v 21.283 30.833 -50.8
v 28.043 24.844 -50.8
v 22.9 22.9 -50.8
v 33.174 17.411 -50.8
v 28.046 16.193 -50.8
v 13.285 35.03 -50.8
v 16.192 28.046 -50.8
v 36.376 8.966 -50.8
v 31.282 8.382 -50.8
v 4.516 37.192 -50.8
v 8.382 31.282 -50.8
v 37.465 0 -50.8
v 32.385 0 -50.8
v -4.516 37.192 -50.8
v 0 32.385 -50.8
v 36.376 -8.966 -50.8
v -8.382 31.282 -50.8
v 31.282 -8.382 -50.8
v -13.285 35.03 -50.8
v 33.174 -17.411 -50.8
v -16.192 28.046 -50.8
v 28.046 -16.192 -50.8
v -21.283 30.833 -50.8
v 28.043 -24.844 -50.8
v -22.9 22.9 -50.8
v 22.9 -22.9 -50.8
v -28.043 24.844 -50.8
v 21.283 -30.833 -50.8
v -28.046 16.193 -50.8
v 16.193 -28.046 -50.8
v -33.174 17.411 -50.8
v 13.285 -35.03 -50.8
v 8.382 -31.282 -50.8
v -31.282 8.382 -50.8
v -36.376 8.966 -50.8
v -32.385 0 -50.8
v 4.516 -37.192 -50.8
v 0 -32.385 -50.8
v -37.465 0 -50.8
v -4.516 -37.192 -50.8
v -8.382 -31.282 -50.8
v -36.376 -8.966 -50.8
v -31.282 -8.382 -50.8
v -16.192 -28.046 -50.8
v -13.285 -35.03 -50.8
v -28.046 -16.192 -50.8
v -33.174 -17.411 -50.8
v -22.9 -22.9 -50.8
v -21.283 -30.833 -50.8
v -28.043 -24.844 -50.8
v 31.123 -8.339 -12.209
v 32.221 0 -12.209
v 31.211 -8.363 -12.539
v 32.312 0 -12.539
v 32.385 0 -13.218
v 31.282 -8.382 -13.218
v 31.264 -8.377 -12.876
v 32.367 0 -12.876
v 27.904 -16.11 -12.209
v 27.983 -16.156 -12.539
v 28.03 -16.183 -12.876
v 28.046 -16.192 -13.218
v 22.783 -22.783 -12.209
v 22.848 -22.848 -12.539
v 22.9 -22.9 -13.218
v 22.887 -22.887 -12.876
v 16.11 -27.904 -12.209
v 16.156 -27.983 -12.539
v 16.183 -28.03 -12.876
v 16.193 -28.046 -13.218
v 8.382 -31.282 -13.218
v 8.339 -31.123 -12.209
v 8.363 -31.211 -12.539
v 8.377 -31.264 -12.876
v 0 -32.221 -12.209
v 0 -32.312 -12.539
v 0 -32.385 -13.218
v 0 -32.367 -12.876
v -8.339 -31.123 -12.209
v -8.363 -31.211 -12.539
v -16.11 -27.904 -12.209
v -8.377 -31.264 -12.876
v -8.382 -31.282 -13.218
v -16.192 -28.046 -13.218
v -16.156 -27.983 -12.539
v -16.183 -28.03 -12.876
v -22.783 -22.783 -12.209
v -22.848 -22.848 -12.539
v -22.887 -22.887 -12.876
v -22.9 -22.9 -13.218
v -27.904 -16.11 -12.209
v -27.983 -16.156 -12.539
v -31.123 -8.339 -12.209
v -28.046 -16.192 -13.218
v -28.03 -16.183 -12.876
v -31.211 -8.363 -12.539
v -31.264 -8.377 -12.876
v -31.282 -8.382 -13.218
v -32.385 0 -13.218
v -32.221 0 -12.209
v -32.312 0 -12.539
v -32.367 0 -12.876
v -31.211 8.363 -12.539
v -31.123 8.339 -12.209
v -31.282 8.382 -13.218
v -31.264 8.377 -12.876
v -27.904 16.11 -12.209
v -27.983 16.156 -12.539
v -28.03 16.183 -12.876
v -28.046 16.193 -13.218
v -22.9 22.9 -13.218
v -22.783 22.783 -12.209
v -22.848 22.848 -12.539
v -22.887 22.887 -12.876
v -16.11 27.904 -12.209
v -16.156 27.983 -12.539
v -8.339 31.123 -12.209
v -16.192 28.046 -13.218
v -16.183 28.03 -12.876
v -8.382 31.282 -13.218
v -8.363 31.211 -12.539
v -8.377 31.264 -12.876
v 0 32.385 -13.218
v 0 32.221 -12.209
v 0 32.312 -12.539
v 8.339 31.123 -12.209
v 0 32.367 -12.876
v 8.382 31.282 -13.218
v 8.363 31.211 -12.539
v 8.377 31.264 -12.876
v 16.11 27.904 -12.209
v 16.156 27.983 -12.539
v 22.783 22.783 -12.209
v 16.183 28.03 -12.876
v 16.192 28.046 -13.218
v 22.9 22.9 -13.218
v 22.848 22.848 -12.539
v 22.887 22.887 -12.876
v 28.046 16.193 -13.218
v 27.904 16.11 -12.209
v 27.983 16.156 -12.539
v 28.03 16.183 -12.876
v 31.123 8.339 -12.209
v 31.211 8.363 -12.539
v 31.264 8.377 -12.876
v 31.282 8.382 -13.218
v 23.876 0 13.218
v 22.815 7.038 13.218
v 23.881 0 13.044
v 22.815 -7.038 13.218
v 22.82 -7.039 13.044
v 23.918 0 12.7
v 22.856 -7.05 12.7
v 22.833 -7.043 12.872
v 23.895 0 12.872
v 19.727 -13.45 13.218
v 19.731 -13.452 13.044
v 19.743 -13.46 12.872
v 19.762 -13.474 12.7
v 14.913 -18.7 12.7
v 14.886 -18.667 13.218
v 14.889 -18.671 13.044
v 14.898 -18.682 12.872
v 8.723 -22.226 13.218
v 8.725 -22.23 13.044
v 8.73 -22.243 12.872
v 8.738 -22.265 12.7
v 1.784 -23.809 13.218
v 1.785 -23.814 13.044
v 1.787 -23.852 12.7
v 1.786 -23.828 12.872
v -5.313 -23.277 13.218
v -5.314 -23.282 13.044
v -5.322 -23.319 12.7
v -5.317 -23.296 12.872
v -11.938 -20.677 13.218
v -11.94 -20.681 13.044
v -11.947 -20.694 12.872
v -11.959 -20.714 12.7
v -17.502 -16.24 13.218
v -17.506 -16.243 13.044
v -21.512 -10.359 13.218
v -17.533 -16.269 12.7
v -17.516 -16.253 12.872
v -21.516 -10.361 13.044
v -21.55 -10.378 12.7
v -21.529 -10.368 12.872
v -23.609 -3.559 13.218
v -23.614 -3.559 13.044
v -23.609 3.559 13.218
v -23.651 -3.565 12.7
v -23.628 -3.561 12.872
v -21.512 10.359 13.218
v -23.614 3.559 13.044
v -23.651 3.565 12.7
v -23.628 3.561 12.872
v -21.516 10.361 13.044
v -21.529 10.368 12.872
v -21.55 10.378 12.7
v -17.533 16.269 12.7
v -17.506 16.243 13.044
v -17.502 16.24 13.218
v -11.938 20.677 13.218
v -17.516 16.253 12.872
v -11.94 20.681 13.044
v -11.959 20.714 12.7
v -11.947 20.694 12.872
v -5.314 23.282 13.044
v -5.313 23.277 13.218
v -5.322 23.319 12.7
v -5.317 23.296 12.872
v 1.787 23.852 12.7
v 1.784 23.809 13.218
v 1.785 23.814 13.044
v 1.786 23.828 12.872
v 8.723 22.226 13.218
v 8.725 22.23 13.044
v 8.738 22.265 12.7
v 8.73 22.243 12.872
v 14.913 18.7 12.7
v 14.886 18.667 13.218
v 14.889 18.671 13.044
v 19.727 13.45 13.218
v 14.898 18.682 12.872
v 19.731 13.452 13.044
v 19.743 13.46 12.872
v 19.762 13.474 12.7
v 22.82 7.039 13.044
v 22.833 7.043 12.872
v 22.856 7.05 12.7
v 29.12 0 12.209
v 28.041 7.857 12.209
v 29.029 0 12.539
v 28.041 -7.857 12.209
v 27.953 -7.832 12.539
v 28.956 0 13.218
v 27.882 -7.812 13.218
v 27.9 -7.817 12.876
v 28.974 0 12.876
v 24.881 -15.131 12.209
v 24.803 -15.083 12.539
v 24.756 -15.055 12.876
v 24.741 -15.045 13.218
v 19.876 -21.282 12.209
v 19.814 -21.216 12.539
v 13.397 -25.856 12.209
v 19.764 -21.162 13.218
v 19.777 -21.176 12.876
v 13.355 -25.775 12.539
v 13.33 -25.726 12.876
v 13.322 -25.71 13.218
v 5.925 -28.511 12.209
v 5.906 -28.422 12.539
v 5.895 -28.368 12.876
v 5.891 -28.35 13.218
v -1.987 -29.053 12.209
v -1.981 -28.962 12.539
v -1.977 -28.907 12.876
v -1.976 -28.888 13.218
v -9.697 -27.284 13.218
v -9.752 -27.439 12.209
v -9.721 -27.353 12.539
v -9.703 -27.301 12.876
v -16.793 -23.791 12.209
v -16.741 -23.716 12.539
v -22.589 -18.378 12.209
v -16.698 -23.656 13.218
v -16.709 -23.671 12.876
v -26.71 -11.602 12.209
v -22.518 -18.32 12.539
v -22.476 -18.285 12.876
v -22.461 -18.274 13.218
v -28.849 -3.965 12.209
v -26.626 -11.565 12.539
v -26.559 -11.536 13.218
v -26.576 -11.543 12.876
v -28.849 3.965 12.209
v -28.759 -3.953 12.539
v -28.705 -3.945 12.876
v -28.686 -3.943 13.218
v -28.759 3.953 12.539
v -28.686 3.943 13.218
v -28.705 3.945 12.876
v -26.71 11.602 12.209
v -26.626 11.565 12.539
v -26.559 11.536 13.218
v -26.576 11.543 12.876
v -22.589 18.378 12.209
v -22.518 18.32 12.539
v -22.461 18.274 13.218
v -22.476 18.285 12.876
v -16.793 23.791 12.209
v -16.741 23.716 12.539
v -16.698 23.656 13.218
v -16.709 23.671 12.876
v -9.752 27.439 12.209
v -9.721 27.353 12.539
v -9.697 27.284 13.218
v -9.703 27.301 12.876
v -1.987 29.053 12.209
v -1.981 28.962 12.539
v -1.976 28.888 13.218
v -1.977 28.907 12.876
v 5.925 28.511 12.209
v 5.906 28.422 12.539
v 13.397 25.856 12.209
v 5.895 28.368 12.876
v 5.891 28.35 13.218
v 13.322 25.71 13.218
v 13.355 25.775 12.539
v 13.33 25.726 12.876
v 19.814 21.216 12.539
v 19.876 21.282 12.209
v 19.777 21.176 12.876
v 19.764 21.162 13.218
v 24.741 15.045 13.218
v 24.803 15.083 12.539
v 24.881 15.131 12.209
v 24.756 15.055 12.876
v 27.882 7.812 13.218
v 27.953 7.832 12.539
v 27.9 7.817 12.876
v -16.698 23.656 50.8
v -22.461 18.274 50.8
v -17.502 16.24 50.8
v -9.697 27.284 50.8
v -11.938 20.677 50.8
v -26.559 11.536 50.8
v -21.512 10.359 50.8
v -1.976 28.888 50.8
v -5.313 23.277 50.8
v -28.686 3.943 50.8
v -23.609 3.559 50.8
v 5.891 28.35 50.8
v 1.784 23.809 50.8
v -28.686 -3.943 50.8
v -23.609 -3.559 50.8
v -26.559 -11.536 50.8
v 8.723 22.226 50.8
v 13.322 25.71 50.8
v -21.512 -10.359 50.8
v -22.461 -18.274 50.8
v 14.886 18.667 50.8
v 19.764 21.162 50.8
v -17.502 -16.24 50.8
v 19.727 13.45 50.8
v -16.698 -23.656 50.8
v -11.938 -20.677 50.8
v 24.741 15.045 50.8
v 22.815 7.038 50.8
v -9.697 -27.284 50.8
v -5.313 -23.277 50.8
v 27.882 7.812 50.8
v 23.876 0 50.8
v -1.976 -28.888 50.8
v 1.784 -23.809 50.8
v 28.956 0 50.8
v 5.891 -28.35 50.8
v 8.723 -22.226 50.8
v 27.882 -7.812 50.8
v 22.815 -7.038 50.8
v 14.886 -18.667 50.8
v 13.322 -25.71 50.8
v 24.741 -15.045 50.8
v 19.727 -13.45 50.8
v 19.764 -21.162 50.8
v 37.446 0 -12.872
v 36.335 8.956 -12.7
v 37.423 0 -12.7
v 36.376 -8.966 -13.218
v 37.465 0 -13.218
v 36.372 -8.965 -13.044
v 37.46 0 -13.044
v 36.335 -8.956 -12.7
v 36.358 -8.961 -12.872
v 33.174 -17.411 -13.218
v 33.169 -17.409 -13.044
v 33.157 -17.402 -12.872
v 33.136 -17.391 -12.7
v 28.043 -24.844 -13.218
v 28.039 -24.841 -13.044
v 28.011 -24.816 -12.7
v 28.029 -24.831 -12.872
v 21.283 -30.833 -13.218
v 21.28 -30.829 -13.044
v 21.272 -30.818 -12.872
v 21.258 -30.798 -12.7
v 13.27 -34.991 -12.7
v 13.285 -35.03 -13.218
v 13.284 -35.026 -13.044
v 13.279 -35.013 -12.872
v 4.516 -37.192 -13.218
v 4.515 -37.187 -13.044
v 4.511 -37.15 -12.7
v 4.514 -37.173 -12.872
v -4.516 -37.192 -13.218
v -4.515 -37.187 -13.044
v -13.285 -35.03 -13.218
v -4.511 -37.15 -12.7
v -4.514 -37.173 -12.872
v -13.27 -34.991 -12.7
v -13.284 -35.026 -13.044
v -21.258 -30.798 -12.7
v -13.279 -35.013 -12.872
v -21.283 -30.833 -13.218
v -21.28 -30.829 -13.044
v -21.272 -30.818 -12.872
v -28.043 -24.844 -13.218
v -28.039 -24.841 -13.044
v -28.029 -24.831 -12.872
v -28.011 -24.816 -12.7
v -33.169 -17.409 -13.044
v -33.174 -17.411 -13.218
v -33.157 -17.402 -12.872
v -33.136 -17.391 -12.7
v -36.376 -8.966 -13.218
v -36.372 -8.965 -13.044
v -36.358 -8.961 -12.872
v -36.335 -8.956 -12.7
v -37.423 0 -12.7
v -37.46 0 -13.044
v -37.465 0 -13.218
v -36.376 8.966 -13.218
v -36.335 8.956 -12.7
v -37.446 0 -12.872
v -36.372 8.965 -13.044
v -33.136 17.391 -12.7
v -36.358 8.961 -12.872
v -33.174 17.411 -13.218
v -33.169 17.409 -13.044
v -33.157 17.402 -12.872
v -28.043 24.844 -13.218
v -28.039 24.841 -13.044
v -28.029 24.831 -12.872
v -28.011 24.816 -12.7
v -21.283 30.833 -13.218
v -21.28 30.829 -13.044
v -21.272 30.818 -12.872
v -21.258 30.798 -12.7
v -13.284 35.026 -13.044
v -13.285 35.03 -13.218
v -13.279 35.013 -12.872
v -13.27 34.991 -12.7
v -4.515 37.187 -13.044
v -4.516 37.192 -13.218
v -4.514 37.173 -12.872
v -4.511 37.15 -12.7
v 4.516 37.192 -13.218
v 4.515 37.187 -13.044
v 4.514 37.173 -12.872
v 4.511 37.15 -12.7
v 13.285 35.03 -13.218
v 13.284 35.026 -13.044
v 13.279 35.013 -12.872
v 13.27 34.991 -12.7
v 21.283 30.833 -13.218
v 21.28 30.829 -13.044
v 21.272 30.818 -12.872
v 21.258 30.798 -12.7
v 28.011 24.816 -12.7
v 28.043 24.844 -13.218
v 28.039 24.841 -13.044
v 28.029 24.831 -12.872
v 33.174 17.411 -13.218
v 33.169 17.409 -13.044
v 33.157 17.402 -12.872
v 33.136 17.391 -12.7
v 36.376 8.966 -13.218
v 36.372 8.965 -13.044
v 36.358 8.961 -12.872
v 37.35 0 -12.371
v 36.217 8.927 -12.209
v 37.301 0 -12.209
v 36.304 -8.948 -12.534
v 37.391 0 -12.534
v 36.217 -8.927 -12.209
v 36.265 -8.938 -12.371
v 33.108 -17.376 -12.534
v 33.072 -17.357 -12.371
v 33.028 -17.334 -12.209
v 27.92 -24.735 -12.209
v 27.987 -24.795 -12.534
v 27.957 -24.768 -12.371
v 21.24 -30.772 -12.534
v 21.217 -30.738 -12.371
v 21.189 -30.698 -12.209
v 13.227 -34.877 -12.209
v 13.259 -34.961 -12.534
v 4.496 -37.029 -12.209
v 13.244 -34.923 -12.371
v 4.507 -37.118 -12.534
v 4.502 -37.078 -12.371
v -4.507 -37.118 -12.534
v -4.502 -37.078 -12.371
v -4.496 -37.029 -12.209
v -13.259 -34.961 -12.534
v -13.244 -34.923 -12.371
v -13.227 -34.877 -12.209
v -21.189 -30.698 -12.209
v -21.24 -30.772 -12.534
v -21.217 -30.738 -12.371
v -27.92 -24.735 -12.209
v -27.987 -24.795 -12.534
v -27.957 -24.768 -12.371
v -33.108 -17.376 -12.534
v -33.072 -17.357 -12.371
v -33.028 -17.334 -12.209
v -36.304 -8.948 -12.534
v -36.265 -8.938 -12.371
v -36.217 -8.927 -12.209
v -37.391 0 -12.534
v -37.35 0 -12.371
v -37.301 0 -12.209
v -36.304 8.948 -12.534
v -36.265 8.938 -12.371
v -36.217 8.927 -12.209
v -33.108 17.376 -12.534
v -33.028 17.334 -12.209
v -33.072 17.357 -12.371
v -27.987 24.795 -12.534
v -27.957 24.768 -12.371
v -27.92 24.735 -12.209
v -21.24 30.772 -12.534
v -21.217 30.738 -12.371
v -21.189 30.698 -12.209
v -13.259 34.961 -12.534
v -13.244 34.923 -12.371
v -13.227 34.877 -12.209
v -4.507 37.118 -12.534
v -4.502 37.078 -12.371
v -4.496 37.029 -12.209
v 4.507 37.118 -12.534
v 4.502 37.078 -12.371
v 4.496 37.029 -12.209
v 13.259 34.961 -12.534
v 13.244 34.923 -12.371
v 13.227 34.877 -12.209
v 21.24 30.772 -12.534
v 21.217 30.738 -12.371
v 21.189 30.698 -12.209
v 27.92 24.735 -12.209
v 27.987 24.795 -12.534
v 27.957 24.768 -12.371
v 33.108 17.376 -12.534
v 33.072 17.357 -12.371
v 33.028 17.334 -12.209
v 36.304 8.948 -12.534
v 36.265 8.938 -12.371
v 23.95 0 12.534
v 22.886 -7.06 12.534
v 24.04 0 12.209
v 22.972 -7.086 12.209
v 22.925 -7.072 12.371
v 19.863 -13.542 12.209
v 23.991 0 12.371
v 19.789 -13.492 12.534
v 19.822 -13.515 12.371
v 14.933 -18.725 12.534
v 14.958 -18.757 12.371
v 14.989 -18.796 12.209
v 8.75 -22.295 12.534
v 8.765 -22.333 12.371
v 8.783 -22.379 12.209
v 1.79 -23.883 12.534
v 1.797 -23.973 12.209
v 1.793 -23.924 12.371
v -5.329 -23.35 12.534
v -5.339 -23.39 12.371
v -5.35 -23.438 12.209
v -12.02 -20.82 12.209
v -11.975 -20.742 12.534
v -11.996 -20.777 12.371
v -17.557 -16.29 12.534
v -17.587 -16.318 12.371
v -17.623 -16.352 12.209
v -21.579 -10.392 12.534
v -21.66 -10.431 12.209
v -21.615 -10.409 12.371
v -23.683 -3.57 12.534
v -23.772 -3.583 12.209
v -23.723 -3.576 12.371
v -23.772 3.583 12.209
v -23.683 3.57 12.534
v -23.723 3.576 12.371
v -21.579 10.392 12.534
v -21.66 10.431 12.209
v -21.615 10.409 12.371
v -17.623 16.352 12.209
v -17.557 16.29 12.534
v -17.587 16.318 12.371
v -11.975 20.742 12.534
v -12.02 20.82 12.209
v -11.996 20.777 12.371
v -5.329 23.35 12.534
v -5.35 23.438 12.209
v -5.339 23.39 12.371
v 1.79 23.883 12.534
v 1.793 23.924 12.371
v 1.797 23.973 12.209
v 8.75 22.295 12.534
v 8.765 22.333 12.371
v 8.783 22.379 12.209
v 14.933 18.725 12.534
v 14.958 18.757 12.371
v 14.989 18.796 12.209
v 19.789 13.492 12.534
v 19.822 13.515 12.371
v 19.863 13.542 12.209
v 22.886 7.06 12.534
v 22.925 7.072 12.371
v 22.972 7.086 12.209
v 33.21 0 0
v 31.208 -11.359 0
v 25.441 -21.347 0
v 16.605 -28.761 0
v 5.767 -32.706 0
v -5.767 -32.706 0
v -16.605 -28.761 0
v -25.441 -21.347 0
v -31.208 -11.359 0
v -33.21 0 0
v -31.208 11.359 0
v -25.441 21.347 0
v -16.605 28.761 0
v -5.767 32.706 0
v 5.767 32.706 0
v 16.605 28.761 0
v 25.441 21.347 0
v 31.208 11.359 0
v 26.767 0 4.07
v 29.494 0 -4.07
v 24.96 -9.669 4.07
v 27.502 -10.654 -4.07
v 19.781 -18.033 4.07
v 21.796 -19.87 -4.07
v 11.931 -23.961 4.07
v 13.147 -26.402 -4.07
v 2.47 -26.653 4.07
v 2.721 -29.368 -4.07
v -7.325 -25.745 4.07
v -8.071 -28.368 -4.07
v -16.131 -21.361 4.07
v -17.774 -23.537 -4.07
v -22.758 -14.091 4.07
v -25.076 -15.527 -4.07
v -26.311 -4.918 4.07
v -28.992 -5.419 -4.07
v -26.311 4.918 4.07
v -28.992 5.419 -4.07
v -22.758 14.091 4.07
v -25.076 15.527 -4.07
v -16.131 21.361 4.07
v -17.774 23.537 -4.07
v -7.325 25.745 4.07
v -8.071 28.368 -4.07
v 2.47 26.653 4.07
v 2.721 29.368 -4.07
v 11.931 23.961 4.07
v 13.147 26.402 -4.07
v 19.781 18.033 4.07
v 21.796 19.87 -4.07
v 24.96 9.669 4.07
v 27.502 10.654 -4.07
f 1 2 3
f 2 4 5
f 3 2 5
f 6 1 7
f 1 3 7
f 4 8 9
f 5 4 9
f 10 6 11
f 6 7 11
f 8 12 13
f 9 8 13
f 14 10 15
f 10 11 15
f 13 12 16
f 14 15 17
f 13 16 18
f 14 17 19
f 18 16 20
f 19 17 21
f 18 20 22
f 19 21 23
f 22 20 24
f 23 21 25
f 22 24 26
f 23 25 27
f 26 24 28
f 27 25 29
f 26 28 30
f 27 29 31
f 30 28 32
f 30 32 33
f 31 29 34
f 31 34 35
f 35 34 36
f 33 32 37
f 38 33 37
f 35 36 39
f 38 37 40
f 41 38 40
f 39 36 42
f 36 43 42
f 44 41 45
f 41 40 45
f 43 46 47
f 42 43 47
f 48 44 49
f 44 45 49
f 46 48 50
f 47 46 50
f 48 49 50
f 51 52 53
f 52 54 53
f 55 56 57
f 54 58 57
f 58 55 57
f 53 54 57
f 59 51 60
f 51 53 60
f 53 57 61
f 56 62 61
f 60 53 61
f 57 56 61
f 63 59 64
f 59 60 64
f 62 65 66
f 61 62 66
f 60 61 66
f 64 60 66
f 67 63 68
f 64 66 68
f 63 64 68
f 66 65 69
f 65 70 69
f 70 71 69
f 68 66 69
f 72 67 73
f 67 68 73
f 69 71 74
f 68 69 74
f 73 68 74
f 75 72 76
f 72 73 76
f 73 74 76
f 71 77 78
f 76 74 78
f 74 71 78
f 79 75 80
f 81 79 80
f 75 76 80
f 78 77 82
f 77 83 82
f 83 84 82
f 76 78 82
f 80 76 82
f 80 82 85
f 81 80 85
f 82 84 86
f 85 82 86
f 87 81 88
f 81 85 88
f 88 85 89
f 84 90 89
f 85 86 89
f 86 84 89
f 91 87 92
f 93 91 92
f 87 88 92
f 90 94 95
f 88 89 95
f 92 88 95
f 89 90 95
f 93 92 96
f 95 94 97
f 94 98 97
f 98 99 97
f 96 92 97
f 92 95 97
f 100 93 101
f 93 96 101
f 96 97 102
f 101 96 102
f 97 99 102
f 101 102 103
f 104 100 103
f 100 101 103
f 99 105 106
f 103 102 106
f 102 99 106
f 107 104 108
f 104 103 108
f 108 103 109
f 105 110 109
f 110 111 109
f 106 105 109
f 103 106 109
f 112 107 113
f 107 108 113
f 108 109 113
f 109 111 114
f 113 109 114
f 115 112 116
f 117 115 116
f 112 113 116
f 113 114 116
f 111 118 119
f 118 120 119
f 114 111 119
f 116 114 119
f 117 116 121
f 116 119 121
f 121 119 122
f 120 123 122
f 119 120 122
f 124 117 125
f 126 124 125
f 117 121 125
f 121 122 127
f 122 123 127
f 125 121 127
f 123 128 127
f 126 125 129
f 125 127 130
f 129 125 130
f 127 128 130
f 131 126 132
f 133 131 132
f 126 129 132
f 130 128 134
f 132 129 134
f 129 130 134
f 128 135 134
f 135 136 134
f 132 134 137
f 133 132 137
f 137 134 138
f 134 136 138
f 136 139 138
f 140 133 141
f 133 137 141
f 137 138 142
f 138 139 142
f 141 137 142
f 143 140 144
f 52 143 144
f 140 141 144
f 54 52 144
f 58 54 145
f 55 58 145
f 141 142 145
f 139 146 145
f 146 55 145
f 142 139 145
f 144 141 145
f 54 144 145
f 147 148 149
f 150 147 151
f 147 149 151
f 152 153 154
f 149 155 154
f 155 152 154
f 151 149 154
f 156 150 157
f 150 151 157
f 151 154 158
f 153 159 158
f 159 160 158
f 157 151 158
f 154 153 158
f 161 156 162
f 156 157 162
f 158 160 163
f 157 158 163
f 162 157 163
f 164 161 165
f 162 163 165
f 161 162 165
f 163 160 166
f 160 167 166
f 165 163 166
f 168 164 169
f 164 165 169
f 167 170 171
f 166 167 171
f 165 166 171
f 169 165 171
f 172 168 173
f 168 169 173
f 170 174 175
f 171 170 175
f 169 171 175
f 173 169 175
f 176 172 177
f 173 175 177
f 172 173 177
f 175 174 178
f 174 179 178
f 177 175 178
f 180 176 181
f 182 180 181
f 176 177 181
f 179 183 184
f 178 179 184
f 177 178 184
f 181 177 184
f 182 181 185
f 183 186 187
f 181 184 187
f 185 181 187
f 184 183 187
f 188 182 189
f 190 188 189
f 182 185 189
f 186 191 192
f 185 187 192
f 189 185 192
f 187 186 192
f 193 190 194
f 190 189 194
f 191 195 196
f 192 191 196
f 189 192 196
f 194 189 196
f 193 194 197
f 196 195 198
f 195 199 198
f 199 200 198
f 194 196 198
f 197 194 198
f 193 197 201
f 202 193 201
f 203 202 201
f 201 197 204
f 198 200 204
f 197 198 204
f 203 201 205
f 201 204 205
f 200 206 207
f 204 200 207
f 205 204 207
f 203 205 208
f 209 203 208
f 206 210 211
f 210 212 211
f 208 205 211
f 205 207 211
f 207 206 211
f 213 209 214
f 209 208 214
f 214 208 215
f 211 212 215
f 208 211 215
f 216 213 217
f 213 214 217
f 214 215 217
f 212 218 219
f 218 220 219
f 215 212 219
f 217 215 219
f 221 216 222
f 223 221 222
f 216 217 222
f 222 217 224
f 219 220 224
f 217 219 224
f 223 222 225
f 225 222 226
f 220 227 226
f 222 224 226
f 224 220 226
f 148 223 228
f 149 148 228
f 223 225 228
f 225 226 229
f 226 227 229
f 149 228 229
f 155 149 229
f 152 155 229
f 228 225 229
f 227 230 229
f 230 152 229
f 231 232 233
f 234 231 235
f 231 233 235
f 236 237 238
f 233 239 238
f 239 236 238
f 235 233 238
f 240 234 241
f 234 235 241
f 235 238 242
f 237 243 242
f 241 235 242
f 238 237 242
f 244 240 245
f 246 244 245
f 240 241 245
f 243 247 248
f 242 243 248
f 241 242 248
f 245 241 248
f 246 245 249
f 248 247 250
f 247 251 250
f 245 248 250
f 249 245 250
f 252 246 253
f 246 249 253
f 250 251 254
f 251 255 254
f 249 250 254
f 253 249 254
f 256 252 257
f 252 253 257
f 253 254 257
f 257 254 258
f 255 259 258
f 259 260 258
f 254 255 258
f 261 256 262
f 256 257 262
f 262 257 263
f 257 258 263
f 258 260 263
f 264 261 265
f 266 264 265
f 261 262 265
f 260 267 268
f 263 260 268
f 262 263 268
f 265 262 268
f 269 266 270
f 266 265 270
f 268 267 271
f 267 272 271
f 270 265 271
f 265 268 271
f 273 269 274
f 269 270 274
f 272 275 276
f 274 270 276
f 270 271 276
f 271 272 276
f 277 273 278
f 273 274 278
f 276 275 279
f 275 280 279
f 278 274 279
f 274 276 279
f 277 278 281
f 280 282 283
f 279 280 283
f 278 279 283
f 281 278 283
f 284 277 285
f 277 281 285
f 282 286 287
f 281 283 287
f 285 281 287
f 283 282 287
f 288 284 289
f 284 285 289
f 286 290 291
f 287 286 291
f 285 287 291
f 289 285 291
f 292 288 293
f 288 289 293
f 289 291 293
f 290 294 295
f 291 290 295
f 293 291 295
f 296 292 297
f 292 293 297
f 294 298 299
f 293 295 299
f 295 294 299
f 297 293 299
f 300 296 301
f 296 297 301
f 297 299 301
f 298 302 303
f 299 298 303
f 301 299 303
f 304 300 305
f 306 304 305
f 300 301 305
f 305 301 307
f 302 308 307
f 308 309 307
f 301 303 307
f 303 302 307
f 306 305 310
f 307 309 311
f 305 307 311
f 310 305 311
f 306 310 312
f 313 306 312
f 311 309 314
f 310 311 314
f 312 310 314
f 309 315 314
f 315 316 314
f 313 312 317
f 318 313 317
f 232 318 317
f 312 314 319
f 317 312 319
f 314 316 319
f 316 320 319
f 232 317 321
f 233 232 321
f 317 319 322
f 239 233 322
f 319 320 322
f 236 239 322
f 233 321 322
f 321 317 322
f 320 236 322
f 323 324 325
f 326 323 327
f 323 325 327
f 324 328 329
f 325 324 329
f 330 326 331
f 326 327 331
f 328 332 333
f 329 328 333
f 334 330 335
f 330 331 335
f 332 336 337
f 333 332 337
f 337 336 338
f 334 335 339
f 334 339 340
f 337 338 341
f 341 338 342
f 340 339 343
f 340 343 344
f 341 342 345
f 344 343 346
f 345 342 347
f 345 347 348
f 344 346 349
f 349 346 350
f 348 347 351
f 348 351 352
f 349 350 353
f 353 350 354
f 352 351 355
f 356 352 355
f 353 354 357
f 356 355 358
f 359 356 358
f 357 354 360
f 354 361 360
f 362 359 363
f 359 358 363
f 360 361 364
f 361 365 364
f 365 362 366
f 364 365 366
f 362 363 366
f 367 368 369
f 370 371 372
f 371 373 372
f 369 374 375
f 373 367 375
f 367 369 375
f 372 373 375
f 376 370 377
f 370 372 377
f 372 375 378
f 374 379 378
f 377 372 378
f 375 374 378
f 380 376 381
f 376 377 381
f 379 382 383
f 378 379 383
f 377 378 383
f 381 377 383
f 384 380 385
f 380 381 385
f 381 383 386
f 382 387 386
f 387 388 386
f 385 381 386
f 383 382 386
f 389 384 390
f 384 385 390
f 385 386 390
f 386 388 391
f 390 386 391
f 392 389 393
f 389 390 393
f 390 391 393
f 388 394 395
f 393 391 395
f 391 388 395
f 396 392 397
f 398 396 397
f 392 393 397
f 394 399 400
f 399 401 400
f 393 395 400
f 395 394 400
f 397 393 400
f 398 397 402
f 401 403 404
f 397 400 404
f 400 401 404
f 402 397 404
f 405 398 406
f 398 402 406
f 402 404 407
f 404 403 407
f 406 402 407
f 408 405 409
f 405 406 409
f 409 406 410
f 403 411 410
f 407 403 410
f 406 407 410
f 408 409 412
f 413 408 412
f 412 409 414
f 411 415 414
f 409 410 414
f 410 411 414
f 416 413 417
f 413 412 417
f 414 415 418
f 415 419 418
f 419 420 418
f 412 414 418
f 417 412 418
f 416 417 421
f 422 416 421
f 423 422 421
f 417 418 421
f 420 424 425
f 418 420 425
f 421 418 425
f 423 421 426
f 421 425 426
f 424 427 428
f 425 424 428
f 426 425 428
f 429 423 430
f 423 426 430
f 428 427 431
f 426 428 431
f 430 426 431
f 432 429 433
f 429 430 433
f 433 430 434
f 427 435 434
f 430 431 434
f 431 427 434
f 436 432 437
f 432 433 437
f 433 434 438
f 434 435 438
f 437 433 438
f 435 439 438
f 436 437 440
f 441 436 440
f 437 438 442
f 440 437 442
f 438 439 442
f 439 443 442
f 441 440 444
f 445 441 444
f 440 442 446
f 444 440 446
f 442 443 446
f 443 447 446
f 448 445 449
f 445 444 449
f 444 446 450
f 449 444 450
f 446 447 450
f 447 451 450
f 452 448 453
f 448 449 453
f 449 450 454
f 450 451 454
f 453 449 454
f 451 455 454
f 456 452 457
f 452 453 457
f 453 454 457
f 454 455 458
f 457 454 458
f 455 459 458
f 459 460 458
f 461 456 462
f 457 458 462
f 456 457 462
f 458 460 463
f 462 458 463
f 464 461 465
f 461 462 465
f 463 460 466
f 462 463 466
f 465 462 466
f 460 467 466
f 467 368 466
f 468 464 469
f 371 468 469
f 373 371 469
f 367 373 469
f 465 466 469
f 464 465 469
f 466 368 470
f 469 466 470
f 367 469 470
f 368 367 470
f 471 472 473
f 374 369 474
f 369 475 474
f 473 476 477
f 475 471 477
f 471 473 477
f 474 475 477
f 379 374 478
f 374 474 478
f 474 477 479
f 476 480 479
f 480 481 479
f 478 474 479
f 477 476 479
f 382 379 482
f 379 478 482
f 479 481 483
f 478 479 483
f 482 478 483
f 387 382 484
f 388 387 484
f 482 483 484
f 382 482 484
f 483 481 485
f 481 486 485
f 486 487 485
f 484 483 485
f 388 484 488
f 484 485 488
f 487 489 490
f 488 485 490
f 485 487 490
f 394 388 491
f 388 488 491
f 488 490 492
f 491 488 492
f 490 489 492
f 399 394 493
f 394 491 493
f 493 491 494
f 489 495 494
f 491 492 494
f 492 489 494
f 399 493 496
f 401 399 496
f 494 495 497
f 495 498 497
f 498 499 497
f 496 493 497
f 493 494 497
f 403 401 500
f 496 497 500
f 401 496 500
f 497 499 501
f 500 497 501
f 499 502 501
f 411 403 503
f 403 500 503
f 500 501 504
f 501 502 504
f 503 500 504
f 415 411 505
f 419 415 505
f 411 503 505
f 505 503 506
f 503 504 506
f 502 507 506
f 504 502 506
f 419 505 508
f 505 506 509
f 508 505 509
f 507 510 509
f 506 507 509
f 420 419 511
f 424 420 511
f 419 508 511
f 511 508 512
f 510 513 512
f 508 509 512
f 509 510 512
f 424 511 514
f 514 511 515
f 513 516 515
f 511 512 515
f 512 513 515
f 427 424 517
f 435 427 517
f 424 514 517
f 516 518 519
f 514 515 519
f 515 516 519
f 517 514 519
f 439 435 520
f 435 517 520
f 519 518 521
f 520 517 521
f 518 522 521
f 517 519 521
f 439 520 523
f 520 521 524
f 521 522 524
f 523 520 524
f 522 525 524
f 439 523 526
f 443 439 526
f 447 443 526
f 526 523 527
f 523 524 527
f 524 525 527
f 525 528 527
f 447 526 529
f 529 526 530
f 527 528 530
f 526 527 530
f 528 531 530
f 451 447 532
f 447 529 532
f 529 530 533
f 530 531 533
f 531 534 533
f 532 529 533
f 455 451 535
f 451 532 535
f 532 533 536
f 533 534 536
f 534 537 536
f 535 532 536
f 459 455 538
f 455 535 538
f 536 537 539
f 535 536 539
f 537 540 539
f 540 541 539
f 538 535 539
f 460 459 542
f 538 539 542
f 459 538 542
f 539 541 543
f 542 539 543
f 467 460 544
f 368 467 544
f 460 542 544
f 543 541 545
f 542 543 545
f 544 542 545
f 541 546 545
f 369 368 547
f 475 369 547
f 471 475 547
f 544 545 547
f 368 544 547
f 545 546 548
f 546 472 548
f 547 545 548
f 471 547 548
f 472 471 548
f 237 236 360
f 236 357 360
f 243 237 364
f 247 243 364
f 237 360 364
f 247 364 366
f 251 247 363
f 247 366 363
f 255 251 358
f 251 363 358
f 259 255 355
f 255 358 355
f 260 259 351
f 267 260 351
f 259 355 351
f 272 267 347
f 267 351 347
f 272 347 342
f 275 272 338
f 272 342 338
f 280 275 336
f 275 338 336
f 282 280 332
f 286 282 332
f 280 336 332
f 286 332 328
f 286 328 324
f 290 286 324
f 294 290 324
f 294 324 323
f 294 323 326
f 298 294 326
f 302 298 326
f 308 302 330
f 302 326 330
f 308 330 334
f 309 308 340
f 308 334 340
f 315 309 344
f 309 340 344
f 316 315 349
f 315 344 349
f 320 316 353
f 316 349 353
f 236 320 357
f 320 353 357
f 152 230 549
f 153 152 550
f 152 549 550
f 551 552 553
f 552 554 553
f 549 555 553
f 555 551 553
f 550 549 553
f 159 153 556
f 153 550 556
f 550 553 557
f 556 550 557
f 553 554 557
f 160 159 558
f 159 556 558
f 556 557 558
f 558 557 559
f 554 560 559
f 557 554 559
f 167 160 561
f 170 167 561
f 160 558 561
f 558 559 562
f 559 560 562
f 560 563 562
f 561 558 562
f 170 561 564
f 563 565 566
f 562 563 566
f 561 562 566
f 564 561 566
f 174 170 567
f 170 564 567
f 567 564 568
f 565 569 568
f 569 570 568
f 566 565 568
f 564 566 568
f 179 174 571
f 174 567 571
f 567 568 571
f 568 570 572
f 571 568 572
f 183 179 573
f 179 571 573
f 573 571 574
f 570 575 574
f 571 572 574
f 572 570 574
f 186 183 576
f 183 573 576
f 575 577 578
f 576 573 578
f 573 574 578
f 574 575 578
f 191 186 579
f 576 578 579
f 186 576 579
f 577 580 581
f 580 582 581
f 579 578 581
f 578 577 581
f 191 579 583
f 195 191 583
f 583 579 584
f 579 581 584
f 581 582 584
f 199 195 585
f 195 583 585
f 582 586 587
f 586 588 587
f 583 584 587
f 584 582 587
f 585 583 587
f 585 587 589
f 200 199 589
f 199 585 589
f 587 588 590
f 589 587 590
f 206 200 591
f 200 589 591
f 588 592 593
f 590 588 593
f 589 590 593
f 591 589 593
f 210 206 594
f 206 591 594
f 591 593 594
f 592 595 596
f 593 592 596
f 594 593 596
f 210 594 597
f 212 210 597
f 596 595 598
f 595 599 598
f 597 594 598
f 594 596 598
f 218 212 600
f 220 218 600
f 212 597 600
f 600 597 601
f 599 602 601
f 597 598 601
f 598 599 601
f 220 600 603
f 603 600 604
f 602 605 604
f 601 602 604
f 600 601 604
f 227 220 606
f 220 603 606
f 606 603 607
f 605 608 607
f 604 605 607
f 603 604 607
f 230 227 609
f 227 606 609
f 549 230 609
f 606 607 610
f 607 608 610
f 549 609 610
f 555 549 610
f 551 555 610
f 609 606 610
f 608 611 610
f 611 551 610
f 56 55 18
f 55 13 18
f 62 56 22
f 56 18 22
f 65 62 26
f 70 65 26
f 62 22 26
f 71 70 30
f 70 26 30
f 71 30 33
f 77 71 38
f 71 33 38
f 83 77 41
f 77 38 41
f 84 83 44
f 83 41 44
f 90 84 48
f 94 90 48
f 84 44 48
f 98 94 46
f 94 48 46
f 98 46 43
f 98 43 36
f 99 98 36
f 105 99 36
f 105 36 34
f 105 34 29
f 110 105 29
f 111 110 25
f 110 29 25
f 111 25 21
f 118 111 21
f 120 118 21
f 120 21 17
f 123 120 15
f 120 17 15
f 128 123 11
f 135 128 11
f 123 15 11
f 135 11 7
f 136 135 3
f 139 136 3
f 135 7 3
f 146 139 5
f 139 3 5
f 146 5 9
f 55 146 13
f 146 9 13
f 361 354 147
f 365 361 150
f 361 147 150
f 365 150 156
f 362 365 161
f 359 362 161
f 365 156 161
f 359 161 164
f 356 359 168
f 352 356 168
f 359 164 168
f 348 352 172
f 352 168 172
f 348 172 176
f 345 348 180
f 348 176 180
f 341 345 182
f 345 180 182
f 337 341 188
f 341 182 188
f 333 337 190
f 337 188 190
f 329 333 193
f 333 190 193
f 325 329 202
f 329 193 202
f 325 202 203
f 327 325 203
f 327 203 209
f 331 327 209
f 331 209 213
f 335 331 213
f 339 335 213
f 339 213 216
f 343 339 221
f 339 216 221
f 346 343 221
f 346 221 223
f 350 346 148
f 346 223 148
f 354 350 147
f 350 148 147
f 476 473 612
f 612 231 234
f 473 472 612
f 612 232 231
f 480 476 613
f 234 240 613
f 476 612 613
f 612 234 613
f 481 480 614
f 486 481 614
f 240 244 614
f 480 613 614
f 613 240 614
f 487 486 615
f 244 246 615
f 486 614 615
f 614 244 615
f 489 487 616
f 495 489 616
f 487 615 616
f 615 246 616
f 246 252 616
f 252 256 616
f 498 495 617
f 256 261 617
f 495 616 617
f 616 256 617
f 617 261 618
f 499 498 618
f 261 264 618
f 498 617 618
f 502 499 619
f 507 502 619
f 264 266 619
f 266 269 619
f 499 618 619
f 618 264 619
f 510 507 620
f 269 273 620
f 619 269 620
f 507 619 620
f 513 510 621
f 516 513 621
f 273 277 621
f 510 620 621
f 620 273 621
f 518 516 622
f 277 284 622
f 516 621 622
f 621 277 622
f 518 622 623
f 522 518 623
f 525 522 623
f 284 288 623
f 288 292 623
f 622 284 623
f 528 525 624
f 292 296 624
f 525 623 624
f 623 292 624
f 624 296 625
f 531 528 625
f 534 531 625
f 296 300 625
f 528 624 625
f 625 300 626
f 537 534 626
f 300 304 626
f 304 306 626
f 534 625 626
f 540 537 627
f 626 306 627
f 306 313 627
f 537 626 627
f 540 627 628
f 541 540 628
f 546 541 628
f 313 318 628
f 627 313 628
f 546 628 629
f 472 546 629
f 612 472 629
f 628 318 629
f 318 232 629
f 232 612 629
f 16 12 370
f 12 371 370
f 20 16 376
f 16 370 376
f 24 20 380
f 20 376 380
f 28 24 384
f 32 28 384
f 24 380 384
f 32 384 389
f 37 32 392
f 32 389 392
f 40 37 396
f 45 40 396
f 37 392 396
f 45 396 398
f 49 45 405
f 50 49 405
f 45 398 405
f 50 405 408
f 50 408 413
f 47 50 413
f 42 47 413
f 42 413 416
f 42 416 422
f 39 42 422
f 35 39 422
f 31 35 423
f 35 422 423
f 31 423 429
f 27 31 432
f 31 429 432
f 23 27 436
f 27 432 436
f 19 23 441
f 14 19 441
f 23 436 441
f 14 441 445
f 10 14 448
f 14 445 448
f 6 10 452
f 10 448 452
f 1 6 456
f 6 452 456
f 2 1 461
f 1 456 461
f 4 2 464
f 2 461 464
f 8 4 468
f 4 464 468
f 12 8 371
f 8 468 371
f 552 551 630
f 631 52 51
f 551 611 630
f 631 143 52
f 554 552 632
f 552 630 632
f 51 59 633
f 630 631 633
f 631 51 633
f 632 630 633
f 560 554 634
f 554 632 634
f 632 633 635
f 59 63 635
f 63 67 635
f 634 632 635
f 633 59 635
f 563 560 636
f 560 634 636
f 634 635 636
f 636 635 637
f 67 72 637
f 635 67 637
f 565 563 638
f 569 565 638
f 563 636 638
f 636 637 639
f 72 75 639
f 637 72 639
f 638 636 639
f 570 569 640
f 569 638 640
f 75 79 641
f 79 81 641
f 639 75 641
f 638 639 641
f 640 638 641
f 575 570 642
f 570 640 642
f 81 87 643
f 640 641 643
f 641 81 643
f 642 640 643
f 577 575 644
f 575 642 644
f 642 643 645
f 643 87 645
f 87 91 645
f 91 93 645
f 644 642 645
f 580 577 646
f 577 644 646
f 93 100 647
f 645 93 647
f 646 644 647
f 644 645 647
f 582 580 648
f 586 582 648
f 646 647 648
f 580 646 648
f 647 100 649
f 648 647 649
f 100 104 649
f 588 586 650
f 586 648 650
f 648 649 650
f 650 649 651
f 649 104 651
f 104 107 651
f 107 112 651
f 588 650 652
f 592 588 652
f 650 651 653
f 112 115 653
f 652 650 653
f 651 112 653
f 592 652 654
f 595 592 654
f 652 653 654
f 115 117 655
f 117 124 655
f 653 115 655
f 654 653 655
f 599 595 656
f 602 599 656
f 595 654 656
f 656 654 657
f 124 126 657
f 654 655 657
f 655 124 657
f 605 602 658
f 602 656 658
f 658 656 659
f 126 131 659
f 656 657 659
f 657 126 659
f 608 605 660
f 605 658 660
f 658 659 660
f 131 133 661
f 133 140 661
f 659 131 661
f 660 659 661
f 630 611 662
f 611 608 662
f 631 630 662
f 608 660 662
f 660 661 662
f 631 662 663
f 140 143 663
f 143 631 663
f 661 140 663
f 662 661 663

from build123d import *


with BuildPart() as f1:
    # F0 (on Front) → F1 (revolve)
    with BuildSketch(Plane.XZ):
        with BuildLine():
            Line((28.956, 50.8), (23.876, 50.8))
            Line((23.876, 50.8), (23.876, 13.217675))
            ThreePointArc((23.876, 13.217675), (23.88664, 12.957967), (23.918487, 12.7))
            ThreePointArc((23.918487, 12.7), (23.969673, 12.452136), (24.040439, 12.209137))
            Line((24.040439, 12.209137), (32.220561, -12.209137))
            ThreePointArc((32.220561, -12.209137), (32.343621, -12.706747), (32.385, -13.217675))
            Line((32.385, -13.217675), (32.385, -50.8))
            Line((32.385, -50.8), (37.465, -50.8))
            Line((37.465, -50.8), (37.465, -13.217675))
            ThreePointArc((37.465, -13.217675), (37.45436, -12.957967), (37.422513, -12.7))
            ThreePointArc((37.422513, -12.7), (37.371327, -12.452136), (37.300561, -12.209137))
            Line((37.300561, -12.209137), (29.120439, 12.209137))
            ThreePointArc((29.120439, 12.209137), (28.997379, 12.706747), (28.956, 13.217675))
            Line((28.956, 13.217675), (28.956, 50.8))
        make_face()
    revolve(axis=Axis((0, 0, 0), (0, 0, -1)))


solid = f1.part
